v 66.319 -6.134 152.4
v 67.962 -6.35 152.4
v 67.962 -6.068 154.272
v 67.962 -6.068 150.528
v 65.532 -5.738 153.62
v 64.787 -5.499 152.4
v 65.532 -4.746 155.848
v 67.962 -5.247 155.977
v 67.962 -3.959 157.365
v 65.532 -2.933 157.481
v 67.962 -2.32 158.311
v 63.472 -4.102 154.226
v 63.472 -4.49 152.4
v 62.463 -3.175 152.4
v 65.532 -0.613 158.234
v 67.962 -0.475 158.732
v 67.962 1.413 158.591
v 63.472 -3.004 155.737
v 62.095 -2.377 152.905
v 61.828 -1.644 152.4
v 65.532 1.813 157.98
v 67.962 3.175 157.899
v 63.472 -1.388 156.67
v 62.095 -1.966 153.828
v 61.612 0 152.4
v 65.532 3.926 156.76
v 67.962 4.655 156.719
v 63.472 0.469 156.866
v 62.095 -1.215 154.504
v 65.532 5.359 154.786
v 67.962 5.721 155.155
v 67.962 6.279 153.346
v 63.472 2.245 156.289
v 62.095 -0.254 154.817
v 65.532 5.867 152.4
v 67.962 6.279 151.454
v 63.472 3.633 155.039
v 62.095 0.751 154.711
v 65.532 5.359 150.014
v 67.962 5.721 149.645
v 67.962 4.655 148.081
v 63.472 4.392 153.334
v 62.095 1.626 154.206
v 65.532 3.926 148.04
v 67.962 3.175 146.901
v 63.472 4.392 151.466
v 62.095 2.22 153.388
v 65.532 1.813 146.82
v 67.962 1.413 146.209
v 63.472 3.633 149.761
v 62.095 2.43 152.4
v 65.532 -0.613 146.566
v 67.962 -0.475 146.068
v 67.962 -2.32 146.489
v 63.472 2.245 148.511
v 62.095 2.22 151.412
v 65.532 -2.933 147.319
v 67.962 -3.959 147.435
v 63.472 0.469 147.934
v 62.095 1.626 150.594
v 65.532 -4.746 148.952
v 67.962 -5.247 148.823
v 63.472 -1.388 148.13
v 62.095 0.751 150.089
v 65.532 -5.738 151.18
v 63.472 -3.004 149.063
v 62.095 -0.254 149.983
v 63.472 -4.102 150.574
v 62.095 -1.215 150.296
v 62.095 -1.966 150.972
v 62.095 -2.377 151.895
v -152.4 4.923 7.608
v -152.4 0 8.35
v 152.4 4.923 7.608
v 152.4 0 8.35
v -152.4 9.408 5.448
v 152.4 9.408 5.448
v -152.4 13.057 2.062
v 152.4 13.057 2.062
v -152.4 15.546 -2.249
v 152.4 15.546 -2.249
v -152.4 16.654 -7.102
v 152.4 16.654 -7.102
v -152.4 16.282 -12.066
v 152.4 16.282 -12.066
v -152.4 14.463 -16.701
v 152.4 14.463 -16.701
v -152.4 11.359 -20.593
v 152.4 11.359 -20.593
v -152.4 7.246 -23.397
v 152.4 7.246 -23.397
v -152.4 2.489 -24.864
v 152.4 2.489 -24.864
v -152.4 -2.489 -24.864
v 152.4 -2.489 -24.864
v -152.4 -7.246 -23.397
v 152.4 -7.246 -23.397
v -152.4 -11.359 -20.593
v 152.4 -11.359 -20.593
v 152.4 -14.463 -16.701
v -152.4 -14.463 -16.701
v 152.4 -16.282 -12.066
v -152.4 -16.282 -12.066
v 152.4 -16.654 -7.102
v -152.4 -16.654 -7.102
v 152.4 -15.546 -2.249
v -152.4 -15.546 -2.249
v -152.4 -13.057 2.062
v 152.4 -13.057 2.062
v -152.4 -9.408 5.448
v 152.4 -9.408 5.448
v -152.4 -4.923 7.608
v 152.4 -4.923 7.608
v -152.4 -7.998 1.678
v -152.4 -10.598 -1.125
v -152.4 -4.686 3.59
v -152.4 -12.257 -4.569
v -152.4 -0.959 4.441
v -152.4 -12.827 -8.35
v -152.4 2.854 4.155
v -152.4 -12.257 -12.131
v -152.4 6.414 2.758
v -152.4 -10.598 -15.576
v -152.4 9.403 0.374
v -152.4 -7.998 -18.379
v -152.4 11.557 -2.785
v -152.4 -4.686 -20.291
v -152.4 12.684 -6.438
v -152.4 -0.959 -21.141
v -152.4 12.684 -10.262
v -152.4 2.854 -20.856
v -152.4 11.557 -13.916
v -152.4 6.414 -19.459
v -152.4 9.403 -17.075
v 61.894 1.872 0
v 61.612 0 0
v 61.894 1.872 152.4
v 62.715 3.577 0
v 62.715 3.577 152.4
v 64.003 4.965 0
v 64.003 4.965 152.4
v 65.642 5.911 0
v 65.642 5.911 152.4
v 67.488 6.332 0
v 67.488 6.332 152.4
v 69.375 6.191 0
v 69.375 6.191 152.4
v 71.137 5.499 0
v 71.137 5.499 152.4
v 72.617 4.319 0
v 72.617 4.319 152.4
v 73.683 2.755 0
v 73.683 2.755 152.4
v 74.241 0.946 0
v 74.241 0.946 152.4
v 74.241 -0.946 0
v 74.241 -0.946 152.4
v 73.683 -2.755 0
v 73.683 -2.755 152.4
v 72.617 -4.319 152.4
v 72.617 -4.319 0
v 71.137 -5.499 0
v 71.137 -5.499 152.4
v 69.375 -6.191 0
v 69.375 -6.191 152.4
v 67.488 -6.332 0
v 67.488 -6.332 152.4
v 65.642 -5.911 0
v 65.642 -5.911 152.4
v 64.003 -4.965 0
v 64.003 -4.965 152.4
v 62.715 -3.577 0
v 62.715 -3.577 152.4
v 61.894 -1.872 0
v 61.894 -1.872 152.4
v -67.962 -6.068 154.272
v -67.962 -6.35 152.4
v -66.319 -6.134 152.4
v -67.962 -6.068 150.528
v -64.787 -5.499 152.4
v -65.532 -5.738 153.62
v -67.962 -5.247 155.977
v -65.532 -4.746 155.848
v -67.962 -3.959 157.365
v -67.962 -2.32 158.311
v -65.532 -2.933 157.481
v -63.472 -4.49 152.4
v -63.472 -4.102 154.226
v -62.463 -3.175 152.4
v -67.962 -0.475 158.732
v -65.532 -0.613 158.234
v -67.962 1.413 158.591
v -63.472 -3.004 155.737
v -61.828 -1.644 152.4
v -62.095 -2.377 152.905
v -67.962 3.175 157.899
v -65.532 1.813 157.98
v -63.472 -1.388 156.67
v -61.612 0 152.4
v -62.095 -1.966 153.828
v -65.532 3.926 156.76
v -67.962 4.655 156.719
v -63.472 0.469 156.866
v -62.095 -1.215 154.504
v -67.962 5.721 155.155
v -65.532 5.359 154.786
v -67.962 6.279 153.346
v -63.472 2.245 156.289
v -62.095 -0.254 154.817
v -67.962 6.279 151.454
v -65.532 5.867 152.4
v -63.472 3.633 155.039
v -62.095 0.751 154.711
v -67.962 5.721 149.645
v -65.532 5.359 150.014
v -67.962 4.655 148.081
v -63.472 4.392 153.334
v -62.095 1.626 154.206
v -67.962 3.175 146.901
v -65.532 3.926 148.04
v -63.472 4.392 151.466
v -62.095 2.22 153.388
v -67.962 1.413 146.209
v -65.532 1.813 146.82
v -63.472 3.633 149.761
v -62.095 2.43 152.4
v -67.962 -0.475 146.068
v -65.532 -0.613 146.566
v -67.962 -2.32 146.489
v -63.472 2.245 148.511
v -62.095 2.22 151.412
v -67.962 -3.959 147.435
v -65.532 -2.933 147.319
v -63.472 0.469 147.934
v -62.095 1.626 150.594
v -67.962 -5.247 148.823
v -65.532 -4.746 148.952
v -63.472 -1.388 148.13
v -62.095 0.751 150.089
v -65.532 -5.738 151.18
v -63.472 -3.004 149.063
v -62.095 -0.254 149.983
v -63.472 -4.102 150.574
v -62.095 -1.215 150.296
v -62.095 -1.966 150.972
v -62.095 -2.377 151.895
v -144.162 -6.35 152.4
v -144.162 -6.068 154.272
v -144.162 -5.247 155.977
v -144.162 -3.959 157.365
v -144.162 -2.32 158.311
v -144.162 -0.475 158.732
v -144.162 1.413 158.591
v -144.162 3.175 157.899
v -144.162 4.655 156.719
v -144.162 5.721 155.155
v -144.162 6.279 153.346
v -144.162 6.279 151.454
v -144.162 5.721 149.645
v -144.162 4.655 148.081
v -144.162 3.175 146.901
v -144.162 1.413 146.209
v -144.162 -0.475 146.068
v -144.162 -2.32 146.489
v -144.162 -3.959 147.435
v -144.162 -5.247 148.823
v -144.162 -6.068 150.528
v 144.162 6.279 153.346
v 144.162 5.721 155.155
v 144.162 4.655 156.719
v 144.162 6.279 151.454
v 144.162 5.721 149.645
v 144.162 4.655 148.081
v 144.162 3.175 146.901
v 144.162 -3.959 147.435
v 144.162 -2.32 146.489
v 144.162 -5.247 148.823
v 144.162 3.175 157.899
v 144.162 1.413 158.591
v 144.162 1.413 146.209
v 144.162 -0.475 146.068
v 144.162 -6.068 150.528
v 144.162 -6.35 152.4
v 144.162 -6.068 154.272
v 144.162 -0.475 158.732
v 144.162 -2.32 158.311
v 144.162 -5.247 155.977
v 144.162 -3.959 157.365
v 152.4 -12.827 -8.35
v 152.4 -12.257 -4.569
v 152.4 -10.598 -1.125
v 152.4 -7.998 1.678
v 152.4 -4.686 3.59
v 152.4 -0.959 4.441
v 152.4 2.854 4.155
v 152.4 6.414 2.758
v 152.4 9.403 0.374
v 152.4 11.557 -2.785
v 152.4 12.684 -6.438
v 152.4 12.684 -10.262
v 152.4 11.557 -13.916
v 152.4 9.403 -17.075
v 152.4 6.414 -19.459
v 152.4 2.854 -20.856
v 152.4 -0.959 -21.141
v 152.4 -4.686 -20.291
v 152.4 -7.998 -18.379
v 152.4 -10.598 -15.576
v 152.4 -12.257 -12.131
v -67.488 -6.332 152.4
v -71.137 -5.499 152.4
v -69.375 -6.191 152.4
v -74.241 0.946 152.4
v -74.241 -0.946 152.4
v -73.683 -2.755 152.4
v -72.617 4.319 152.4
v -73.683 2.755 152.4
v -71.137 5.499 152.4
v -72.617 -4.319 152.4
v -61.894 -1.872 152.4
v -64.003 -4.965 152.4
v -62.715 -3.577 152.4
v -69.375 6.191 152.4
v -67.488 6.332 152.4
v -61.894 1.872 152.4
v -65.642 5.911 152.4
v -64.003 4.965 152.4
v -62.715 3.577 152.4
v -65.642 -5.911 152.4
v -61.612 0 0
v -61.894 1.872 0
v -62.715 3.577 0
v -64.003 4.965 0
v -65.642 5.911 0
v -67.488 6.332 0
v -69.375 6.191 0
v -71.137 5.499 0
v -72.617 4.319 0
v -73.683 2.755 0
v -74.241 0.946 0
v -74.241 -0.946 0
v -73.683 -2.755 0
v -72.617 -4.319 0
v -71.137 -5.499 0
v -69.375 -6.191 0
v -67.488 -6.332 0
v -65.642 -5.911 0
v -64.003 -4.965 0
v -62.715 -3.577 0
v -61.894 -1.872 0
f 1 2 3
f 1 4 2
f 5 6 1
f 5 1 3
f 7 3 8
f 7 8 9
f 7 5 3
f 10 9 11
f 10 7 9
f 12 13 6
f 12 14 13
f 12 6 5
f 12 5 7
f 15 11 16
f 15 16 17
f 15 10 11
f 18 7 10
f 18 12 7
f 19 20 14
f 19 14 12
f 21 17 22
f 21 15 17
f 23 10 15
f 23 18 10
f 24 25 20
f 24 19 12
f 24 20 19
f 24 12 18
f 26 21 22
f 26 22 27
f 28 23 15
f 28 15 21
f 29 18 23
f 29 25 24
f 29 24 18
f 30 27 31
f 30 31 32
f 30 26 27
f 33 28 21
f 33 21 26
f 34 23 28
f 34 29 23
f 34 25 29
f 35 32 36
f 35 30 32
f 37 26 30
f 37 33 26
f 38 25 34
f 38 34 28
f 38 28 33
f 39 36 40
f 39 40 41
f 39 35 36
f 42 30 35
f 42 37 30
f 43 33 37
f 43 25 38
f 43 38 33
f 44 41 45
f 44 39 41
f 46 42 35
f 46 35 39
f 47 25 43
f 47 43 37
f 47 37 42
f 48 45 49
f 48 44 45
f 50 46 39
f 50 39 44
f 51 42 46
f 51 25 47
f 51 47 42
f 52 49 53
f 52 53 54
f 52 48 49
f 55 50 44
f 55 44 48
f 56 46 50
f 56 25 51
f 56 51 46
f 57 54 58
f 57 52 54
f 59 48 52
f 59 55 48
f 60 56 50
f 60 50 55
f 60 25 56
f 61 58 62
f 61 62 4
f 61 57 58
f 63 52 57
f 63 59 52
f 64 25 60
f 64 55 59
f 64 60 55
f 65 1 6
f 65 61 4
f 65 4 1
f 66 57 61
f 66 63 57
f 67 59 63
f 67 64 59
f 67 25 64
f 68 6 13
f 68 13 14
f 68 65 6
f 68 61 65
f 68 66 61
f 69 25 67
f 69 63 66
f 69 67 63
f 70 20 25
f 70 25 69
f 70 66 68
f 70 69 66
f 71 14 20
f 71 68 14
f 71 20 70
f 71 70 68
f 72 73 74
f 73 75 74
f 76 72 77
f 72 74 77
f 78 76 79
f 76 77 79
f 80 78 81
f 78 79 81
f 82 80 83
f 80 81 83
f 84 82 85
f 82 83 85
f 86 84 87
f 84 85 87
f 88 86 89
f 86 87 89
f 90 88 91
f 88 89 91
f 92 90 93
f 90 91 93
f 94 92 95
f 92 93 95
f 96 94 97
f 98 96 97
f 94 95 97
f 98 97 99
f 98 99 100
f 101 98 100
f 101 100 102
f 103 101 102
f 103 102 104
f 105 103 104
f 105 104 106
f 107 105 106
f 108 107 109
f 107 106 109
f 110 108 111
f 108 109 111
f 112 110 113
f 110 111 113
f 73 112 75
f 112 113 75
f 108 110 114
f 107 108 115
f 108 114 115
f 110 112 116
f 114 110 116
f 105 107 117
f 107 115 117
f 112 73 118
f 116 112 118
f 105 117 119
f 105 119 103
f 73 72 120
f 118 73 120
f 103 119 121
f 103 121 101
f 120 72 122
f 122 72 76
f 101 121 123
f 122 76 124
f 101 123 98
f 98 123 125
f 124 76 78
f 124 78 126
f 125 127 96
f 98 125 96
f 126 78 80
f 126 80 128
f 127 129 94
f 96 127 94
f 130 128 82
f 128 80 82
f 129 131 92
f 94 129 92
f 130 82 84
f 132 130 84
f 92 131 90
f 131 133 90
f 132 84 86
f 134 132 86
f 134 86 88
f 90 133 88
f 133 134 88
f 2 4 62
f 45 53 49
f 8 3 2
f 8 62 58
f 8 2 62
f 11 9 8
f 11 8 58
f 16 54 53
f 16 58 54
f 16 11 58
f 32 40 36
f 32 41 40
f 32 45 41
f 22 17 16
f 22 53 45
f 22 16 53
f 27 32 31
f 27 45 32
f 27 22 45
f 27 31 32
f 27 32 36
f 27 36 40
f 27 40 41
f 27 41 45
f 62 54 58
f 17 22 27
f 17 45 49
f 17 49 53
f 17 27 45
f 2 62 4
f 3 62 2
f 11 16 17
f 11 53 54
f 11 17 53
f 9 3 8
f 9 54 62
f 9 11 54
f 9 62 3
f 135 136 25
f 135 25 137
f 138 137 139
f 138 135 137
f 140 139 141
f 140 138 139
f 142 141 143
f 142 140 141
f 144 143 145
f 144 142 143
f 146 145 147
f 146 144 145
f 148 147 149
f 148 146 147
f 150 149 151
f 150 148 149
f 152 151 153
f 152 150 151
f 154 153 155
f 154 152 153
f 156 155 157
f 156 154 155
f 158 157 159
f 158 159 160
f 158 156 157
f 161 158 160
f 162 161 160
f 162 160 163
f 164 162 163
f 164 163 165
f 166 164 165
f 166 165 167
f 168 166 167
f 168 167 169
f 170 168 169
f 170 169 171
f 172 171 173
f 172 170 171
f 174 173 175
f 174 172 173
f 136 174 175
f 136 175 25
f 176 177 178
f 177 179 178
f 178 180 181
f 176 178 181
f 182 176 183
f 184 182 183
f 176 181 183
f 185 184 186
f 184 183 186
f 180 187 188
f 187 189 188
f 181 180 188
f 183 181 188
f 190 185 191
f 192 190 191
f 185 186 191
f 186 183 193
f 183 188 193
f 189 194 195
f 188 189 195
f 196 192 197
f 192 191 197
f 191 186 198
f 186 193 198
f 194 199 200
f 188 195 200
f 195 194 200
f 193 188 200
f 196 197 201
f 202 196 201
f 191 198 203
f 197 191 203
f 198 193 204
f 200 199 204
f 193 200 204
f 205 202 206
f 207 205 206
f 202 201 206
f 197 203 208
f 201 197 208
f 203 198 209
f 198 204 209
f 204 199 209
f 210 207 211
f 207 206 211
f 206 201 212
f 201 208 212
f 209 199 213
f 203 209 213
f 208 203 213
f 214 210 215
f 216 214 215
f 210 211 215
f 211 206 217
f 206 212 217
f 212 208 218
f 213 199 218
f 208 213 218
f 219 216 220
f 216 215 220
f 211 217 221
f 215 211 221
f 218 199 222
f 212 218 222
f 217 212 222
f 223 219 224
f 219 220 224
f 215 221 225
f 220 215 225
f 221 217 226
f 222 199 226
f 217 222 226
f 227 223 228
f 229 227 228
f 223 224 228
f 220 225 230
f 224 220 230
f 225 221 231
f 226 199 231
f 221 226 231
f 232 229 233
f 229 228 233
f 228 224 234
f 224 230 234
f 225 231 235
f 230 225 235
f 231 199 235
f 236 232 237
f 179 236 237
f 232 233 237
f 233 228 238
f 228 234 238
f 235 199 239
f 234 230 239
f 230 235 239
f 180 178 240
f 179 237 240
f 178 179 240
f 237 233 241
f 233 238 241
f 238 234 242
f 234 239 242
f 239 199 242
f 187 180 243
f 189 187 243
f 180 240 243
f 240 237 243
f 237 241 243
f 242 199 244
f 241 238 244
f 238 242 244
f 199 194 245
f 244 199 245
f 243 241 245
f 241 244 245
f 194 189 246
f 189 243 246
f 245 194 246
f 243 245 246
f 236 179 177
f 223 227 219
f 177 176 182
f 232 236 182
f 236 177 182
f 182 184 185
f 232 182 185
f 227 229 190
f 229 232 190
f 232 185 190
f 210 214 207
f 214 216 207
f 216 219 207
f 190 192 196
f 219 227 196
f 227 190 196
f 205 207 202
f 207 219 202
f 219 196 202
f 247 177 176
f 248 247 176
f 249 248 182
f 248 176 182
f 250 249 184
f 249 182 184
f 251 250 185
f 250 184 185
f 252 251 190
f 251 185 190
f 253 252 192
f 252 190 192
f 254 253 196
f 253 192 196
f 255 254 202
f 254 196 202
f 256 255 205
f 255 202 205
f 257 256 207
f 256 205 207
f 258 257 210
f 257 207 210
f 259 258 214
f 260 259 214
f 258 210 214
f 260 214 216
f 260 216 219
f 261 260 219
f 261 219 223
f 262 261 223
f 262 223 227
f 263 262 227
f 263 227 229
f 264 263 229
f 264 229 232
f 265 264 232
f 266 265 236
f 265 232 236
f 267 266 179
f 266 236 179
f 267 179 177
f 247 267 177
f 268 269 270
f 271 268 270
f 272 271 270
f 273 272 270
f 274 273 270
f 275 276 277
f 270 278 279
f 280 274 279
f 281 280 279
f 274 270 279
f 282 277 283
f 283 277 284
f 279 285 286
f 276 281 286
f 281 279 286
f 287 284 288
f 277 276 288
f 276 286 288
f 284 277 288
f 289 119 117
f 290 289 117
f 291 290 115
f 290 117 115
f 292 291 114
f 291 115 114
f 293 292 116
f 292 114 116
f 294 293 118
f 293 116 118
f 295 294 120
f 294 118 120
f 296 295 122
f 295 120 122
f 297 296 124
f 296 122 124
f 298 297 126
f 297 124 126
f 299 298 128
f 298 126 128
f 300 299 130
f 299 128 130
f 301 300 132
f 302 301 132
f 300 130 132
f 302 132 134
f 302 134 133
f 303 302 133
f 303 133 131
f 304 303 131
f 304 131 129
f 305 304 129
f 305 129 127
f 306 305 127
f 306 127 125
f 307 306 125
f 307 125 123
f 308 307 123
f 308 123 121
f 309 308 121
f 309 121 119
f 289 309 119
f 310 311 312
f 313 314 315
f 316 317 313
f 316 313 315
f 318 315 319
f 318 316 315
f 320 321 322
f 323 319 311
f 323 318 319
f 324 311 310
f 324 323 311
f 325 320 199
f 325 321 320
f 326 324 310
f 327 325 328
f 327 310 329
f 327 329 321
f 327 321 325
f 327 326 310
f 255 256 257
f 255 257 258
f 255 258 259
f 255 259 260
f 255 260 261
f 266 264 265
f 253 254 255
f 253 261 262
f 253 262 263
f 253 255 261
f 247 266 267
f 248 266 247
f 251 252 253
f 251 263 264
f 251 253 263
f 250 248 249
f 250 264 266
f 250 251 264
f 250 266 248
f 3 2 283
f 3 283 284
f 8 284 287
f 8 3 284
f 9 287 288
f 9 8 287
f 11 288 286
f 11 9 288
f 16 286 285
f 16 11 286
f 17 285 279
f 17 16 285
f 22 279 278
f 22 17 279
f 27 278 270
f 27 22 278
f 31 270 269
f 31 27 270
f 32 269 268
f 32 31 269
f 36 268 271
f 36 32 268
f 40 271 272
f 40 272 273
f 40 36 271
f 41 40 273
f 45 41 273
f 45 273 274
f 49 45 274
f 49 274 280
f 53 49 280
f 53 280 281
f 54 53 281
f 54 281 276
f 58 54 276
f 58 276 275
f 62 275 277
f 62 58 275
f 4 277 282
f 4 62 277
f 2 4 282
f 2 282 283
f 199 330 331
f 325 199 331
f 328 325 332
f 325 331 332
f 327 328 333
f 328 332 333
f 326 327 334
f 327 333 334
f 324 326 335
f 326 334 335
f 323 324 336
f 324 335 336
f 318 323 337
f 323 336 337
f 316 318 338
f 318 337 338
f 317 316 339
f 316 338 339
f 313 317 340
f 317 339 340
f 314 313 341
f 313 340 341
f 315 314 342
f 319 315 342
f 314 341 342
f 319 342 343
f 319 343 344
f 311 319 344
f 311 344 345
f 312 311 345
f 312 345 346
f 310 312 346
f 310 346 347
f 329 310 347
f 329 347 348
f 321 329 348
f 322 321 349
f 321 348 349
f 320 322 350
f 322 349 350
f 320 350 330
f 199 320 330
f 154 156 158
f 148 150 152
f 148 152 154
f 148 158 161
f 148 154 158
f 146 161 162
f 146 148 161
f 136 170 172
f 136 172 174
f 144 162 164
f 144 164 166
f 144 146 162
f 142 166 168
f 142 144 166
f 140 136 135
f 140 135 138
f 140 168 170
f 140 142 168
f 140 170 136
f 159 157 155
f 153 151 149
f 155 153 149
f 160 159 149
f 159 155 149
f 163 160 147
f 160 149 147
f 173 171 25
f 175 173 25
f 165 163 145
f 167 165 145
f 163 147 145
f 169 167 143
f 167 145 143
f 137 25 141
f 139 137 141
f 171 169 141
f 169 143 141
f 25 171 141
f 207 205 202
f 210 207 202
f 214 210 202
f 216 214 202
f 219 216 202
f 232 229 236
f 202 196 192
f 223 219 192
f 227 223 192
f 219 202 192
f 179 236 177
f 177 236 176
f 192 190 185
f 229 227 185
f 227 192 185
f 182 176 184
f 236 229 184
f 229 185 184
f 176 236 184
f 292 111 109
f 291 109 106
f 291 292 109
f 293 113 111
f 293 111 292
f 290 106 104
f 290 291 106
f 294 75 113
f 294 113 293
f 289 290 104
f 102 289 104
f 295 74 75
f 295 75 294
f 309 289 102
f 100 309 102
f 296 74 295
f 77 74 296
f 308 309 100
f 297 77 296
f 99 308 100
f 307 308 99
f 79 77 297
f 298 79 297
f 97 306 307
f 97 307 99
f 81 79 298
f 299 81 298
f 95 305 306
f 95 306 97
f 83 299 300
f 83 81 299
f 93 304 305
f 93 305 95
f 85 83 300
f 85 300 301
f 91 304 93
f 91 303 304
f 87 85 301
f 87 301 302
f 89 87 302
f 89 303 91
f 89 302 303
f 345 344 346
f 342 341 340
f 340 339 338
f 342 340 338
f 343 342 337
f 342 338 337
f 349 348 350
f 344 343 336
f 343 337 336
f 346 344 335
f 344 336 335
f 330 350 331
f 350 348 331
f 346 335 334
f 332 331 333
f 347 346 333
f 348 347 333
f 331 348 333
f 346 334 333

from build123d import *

# Parameters (mm, degrees)
F0_W     = 304.8
F0_H     = 16.7005
F2_R     = 12.827
F4_DEPTH = 304.801
F3_R     = 6.35
F5_DEPTH = 152.4
F8_R     = 6.35
F9_DEPTH = 76.2


with BuildPart() as f1:
    # F0 (on Front) → F1 (revolve)
    with BuildSketch(Plane.XZ):
        Rectangle(F0_W, F0_H)
    revolve(axis=Axis((0, 0, -8.35025), (-1, 0, 0)))

    # F2 (on face) → F4 (cut, through all)
    with BuildSketch(Plane(origin=(-152.4, 0, 0), x_dir=(0, -1, 0), z_dir=(-1, 0, 0))):
        with Locations((0, -8.35025)):
            Circle(F2_R)
    extrude(amount=-F4_DEPTH, mode=Mode.SUBTRACT)


with BuildPart() as f5:
    # F3 (on Top) → F5 (new body)
    with BuildSketch(Plane.XY):
        with Locations((-67.9620431383, 0)):
            Circle(F3_R)
    extrude(amount=F5_DEPTH)


with BuildPart() as f7:
    # F6 (on face) → F7 (revolve)
    with BuildSketch(Plane.XY.offset(152.4)):
        with BuildLine():
            ThreePointArc((-67.9620431383, -6.35), (-63.4719150777, -4.4901280605), (-61.6120431383, 0))
            Line((-61.6120431383, 0), (-67.9620431383, 0))
            Line((-67.9620431383, 0), (-67.9620431383, -6.35))
        make_face()
    revolve(axis=Axis((-64.7870431383, 0, 152.4), (-1, 0, 0)))


with BuildPart() as f9:
    # F8 (on face) → F9 (new body)
    with BuildSketch(Plane(origin=(-67.9620431383, 0, 0), x_dir=(0, -1, 0), z_dir=(-1, 0, 0))):
        with Locations((0, 152.4)):
            Circle(F8_R)
    extrude(amount=F9_DEPTH)


with BuildPart() as f10_1:
    # F10: instance of F9
    add(f9.part.mirror(Plane.YZ))


with BuildPart() as f10_2:
    # F10: instance of F5
    add(f5.part.mirror(Plane.YZ))


with BuildPart() as f10_3:
    # F10: instance of F7
    add(f7.part.mirror(Plane.YZ))


solid = Compound([f1.part, f5.part, f7.part, f9.part, f10_1.part, f10_2.part, f10_3.part])
